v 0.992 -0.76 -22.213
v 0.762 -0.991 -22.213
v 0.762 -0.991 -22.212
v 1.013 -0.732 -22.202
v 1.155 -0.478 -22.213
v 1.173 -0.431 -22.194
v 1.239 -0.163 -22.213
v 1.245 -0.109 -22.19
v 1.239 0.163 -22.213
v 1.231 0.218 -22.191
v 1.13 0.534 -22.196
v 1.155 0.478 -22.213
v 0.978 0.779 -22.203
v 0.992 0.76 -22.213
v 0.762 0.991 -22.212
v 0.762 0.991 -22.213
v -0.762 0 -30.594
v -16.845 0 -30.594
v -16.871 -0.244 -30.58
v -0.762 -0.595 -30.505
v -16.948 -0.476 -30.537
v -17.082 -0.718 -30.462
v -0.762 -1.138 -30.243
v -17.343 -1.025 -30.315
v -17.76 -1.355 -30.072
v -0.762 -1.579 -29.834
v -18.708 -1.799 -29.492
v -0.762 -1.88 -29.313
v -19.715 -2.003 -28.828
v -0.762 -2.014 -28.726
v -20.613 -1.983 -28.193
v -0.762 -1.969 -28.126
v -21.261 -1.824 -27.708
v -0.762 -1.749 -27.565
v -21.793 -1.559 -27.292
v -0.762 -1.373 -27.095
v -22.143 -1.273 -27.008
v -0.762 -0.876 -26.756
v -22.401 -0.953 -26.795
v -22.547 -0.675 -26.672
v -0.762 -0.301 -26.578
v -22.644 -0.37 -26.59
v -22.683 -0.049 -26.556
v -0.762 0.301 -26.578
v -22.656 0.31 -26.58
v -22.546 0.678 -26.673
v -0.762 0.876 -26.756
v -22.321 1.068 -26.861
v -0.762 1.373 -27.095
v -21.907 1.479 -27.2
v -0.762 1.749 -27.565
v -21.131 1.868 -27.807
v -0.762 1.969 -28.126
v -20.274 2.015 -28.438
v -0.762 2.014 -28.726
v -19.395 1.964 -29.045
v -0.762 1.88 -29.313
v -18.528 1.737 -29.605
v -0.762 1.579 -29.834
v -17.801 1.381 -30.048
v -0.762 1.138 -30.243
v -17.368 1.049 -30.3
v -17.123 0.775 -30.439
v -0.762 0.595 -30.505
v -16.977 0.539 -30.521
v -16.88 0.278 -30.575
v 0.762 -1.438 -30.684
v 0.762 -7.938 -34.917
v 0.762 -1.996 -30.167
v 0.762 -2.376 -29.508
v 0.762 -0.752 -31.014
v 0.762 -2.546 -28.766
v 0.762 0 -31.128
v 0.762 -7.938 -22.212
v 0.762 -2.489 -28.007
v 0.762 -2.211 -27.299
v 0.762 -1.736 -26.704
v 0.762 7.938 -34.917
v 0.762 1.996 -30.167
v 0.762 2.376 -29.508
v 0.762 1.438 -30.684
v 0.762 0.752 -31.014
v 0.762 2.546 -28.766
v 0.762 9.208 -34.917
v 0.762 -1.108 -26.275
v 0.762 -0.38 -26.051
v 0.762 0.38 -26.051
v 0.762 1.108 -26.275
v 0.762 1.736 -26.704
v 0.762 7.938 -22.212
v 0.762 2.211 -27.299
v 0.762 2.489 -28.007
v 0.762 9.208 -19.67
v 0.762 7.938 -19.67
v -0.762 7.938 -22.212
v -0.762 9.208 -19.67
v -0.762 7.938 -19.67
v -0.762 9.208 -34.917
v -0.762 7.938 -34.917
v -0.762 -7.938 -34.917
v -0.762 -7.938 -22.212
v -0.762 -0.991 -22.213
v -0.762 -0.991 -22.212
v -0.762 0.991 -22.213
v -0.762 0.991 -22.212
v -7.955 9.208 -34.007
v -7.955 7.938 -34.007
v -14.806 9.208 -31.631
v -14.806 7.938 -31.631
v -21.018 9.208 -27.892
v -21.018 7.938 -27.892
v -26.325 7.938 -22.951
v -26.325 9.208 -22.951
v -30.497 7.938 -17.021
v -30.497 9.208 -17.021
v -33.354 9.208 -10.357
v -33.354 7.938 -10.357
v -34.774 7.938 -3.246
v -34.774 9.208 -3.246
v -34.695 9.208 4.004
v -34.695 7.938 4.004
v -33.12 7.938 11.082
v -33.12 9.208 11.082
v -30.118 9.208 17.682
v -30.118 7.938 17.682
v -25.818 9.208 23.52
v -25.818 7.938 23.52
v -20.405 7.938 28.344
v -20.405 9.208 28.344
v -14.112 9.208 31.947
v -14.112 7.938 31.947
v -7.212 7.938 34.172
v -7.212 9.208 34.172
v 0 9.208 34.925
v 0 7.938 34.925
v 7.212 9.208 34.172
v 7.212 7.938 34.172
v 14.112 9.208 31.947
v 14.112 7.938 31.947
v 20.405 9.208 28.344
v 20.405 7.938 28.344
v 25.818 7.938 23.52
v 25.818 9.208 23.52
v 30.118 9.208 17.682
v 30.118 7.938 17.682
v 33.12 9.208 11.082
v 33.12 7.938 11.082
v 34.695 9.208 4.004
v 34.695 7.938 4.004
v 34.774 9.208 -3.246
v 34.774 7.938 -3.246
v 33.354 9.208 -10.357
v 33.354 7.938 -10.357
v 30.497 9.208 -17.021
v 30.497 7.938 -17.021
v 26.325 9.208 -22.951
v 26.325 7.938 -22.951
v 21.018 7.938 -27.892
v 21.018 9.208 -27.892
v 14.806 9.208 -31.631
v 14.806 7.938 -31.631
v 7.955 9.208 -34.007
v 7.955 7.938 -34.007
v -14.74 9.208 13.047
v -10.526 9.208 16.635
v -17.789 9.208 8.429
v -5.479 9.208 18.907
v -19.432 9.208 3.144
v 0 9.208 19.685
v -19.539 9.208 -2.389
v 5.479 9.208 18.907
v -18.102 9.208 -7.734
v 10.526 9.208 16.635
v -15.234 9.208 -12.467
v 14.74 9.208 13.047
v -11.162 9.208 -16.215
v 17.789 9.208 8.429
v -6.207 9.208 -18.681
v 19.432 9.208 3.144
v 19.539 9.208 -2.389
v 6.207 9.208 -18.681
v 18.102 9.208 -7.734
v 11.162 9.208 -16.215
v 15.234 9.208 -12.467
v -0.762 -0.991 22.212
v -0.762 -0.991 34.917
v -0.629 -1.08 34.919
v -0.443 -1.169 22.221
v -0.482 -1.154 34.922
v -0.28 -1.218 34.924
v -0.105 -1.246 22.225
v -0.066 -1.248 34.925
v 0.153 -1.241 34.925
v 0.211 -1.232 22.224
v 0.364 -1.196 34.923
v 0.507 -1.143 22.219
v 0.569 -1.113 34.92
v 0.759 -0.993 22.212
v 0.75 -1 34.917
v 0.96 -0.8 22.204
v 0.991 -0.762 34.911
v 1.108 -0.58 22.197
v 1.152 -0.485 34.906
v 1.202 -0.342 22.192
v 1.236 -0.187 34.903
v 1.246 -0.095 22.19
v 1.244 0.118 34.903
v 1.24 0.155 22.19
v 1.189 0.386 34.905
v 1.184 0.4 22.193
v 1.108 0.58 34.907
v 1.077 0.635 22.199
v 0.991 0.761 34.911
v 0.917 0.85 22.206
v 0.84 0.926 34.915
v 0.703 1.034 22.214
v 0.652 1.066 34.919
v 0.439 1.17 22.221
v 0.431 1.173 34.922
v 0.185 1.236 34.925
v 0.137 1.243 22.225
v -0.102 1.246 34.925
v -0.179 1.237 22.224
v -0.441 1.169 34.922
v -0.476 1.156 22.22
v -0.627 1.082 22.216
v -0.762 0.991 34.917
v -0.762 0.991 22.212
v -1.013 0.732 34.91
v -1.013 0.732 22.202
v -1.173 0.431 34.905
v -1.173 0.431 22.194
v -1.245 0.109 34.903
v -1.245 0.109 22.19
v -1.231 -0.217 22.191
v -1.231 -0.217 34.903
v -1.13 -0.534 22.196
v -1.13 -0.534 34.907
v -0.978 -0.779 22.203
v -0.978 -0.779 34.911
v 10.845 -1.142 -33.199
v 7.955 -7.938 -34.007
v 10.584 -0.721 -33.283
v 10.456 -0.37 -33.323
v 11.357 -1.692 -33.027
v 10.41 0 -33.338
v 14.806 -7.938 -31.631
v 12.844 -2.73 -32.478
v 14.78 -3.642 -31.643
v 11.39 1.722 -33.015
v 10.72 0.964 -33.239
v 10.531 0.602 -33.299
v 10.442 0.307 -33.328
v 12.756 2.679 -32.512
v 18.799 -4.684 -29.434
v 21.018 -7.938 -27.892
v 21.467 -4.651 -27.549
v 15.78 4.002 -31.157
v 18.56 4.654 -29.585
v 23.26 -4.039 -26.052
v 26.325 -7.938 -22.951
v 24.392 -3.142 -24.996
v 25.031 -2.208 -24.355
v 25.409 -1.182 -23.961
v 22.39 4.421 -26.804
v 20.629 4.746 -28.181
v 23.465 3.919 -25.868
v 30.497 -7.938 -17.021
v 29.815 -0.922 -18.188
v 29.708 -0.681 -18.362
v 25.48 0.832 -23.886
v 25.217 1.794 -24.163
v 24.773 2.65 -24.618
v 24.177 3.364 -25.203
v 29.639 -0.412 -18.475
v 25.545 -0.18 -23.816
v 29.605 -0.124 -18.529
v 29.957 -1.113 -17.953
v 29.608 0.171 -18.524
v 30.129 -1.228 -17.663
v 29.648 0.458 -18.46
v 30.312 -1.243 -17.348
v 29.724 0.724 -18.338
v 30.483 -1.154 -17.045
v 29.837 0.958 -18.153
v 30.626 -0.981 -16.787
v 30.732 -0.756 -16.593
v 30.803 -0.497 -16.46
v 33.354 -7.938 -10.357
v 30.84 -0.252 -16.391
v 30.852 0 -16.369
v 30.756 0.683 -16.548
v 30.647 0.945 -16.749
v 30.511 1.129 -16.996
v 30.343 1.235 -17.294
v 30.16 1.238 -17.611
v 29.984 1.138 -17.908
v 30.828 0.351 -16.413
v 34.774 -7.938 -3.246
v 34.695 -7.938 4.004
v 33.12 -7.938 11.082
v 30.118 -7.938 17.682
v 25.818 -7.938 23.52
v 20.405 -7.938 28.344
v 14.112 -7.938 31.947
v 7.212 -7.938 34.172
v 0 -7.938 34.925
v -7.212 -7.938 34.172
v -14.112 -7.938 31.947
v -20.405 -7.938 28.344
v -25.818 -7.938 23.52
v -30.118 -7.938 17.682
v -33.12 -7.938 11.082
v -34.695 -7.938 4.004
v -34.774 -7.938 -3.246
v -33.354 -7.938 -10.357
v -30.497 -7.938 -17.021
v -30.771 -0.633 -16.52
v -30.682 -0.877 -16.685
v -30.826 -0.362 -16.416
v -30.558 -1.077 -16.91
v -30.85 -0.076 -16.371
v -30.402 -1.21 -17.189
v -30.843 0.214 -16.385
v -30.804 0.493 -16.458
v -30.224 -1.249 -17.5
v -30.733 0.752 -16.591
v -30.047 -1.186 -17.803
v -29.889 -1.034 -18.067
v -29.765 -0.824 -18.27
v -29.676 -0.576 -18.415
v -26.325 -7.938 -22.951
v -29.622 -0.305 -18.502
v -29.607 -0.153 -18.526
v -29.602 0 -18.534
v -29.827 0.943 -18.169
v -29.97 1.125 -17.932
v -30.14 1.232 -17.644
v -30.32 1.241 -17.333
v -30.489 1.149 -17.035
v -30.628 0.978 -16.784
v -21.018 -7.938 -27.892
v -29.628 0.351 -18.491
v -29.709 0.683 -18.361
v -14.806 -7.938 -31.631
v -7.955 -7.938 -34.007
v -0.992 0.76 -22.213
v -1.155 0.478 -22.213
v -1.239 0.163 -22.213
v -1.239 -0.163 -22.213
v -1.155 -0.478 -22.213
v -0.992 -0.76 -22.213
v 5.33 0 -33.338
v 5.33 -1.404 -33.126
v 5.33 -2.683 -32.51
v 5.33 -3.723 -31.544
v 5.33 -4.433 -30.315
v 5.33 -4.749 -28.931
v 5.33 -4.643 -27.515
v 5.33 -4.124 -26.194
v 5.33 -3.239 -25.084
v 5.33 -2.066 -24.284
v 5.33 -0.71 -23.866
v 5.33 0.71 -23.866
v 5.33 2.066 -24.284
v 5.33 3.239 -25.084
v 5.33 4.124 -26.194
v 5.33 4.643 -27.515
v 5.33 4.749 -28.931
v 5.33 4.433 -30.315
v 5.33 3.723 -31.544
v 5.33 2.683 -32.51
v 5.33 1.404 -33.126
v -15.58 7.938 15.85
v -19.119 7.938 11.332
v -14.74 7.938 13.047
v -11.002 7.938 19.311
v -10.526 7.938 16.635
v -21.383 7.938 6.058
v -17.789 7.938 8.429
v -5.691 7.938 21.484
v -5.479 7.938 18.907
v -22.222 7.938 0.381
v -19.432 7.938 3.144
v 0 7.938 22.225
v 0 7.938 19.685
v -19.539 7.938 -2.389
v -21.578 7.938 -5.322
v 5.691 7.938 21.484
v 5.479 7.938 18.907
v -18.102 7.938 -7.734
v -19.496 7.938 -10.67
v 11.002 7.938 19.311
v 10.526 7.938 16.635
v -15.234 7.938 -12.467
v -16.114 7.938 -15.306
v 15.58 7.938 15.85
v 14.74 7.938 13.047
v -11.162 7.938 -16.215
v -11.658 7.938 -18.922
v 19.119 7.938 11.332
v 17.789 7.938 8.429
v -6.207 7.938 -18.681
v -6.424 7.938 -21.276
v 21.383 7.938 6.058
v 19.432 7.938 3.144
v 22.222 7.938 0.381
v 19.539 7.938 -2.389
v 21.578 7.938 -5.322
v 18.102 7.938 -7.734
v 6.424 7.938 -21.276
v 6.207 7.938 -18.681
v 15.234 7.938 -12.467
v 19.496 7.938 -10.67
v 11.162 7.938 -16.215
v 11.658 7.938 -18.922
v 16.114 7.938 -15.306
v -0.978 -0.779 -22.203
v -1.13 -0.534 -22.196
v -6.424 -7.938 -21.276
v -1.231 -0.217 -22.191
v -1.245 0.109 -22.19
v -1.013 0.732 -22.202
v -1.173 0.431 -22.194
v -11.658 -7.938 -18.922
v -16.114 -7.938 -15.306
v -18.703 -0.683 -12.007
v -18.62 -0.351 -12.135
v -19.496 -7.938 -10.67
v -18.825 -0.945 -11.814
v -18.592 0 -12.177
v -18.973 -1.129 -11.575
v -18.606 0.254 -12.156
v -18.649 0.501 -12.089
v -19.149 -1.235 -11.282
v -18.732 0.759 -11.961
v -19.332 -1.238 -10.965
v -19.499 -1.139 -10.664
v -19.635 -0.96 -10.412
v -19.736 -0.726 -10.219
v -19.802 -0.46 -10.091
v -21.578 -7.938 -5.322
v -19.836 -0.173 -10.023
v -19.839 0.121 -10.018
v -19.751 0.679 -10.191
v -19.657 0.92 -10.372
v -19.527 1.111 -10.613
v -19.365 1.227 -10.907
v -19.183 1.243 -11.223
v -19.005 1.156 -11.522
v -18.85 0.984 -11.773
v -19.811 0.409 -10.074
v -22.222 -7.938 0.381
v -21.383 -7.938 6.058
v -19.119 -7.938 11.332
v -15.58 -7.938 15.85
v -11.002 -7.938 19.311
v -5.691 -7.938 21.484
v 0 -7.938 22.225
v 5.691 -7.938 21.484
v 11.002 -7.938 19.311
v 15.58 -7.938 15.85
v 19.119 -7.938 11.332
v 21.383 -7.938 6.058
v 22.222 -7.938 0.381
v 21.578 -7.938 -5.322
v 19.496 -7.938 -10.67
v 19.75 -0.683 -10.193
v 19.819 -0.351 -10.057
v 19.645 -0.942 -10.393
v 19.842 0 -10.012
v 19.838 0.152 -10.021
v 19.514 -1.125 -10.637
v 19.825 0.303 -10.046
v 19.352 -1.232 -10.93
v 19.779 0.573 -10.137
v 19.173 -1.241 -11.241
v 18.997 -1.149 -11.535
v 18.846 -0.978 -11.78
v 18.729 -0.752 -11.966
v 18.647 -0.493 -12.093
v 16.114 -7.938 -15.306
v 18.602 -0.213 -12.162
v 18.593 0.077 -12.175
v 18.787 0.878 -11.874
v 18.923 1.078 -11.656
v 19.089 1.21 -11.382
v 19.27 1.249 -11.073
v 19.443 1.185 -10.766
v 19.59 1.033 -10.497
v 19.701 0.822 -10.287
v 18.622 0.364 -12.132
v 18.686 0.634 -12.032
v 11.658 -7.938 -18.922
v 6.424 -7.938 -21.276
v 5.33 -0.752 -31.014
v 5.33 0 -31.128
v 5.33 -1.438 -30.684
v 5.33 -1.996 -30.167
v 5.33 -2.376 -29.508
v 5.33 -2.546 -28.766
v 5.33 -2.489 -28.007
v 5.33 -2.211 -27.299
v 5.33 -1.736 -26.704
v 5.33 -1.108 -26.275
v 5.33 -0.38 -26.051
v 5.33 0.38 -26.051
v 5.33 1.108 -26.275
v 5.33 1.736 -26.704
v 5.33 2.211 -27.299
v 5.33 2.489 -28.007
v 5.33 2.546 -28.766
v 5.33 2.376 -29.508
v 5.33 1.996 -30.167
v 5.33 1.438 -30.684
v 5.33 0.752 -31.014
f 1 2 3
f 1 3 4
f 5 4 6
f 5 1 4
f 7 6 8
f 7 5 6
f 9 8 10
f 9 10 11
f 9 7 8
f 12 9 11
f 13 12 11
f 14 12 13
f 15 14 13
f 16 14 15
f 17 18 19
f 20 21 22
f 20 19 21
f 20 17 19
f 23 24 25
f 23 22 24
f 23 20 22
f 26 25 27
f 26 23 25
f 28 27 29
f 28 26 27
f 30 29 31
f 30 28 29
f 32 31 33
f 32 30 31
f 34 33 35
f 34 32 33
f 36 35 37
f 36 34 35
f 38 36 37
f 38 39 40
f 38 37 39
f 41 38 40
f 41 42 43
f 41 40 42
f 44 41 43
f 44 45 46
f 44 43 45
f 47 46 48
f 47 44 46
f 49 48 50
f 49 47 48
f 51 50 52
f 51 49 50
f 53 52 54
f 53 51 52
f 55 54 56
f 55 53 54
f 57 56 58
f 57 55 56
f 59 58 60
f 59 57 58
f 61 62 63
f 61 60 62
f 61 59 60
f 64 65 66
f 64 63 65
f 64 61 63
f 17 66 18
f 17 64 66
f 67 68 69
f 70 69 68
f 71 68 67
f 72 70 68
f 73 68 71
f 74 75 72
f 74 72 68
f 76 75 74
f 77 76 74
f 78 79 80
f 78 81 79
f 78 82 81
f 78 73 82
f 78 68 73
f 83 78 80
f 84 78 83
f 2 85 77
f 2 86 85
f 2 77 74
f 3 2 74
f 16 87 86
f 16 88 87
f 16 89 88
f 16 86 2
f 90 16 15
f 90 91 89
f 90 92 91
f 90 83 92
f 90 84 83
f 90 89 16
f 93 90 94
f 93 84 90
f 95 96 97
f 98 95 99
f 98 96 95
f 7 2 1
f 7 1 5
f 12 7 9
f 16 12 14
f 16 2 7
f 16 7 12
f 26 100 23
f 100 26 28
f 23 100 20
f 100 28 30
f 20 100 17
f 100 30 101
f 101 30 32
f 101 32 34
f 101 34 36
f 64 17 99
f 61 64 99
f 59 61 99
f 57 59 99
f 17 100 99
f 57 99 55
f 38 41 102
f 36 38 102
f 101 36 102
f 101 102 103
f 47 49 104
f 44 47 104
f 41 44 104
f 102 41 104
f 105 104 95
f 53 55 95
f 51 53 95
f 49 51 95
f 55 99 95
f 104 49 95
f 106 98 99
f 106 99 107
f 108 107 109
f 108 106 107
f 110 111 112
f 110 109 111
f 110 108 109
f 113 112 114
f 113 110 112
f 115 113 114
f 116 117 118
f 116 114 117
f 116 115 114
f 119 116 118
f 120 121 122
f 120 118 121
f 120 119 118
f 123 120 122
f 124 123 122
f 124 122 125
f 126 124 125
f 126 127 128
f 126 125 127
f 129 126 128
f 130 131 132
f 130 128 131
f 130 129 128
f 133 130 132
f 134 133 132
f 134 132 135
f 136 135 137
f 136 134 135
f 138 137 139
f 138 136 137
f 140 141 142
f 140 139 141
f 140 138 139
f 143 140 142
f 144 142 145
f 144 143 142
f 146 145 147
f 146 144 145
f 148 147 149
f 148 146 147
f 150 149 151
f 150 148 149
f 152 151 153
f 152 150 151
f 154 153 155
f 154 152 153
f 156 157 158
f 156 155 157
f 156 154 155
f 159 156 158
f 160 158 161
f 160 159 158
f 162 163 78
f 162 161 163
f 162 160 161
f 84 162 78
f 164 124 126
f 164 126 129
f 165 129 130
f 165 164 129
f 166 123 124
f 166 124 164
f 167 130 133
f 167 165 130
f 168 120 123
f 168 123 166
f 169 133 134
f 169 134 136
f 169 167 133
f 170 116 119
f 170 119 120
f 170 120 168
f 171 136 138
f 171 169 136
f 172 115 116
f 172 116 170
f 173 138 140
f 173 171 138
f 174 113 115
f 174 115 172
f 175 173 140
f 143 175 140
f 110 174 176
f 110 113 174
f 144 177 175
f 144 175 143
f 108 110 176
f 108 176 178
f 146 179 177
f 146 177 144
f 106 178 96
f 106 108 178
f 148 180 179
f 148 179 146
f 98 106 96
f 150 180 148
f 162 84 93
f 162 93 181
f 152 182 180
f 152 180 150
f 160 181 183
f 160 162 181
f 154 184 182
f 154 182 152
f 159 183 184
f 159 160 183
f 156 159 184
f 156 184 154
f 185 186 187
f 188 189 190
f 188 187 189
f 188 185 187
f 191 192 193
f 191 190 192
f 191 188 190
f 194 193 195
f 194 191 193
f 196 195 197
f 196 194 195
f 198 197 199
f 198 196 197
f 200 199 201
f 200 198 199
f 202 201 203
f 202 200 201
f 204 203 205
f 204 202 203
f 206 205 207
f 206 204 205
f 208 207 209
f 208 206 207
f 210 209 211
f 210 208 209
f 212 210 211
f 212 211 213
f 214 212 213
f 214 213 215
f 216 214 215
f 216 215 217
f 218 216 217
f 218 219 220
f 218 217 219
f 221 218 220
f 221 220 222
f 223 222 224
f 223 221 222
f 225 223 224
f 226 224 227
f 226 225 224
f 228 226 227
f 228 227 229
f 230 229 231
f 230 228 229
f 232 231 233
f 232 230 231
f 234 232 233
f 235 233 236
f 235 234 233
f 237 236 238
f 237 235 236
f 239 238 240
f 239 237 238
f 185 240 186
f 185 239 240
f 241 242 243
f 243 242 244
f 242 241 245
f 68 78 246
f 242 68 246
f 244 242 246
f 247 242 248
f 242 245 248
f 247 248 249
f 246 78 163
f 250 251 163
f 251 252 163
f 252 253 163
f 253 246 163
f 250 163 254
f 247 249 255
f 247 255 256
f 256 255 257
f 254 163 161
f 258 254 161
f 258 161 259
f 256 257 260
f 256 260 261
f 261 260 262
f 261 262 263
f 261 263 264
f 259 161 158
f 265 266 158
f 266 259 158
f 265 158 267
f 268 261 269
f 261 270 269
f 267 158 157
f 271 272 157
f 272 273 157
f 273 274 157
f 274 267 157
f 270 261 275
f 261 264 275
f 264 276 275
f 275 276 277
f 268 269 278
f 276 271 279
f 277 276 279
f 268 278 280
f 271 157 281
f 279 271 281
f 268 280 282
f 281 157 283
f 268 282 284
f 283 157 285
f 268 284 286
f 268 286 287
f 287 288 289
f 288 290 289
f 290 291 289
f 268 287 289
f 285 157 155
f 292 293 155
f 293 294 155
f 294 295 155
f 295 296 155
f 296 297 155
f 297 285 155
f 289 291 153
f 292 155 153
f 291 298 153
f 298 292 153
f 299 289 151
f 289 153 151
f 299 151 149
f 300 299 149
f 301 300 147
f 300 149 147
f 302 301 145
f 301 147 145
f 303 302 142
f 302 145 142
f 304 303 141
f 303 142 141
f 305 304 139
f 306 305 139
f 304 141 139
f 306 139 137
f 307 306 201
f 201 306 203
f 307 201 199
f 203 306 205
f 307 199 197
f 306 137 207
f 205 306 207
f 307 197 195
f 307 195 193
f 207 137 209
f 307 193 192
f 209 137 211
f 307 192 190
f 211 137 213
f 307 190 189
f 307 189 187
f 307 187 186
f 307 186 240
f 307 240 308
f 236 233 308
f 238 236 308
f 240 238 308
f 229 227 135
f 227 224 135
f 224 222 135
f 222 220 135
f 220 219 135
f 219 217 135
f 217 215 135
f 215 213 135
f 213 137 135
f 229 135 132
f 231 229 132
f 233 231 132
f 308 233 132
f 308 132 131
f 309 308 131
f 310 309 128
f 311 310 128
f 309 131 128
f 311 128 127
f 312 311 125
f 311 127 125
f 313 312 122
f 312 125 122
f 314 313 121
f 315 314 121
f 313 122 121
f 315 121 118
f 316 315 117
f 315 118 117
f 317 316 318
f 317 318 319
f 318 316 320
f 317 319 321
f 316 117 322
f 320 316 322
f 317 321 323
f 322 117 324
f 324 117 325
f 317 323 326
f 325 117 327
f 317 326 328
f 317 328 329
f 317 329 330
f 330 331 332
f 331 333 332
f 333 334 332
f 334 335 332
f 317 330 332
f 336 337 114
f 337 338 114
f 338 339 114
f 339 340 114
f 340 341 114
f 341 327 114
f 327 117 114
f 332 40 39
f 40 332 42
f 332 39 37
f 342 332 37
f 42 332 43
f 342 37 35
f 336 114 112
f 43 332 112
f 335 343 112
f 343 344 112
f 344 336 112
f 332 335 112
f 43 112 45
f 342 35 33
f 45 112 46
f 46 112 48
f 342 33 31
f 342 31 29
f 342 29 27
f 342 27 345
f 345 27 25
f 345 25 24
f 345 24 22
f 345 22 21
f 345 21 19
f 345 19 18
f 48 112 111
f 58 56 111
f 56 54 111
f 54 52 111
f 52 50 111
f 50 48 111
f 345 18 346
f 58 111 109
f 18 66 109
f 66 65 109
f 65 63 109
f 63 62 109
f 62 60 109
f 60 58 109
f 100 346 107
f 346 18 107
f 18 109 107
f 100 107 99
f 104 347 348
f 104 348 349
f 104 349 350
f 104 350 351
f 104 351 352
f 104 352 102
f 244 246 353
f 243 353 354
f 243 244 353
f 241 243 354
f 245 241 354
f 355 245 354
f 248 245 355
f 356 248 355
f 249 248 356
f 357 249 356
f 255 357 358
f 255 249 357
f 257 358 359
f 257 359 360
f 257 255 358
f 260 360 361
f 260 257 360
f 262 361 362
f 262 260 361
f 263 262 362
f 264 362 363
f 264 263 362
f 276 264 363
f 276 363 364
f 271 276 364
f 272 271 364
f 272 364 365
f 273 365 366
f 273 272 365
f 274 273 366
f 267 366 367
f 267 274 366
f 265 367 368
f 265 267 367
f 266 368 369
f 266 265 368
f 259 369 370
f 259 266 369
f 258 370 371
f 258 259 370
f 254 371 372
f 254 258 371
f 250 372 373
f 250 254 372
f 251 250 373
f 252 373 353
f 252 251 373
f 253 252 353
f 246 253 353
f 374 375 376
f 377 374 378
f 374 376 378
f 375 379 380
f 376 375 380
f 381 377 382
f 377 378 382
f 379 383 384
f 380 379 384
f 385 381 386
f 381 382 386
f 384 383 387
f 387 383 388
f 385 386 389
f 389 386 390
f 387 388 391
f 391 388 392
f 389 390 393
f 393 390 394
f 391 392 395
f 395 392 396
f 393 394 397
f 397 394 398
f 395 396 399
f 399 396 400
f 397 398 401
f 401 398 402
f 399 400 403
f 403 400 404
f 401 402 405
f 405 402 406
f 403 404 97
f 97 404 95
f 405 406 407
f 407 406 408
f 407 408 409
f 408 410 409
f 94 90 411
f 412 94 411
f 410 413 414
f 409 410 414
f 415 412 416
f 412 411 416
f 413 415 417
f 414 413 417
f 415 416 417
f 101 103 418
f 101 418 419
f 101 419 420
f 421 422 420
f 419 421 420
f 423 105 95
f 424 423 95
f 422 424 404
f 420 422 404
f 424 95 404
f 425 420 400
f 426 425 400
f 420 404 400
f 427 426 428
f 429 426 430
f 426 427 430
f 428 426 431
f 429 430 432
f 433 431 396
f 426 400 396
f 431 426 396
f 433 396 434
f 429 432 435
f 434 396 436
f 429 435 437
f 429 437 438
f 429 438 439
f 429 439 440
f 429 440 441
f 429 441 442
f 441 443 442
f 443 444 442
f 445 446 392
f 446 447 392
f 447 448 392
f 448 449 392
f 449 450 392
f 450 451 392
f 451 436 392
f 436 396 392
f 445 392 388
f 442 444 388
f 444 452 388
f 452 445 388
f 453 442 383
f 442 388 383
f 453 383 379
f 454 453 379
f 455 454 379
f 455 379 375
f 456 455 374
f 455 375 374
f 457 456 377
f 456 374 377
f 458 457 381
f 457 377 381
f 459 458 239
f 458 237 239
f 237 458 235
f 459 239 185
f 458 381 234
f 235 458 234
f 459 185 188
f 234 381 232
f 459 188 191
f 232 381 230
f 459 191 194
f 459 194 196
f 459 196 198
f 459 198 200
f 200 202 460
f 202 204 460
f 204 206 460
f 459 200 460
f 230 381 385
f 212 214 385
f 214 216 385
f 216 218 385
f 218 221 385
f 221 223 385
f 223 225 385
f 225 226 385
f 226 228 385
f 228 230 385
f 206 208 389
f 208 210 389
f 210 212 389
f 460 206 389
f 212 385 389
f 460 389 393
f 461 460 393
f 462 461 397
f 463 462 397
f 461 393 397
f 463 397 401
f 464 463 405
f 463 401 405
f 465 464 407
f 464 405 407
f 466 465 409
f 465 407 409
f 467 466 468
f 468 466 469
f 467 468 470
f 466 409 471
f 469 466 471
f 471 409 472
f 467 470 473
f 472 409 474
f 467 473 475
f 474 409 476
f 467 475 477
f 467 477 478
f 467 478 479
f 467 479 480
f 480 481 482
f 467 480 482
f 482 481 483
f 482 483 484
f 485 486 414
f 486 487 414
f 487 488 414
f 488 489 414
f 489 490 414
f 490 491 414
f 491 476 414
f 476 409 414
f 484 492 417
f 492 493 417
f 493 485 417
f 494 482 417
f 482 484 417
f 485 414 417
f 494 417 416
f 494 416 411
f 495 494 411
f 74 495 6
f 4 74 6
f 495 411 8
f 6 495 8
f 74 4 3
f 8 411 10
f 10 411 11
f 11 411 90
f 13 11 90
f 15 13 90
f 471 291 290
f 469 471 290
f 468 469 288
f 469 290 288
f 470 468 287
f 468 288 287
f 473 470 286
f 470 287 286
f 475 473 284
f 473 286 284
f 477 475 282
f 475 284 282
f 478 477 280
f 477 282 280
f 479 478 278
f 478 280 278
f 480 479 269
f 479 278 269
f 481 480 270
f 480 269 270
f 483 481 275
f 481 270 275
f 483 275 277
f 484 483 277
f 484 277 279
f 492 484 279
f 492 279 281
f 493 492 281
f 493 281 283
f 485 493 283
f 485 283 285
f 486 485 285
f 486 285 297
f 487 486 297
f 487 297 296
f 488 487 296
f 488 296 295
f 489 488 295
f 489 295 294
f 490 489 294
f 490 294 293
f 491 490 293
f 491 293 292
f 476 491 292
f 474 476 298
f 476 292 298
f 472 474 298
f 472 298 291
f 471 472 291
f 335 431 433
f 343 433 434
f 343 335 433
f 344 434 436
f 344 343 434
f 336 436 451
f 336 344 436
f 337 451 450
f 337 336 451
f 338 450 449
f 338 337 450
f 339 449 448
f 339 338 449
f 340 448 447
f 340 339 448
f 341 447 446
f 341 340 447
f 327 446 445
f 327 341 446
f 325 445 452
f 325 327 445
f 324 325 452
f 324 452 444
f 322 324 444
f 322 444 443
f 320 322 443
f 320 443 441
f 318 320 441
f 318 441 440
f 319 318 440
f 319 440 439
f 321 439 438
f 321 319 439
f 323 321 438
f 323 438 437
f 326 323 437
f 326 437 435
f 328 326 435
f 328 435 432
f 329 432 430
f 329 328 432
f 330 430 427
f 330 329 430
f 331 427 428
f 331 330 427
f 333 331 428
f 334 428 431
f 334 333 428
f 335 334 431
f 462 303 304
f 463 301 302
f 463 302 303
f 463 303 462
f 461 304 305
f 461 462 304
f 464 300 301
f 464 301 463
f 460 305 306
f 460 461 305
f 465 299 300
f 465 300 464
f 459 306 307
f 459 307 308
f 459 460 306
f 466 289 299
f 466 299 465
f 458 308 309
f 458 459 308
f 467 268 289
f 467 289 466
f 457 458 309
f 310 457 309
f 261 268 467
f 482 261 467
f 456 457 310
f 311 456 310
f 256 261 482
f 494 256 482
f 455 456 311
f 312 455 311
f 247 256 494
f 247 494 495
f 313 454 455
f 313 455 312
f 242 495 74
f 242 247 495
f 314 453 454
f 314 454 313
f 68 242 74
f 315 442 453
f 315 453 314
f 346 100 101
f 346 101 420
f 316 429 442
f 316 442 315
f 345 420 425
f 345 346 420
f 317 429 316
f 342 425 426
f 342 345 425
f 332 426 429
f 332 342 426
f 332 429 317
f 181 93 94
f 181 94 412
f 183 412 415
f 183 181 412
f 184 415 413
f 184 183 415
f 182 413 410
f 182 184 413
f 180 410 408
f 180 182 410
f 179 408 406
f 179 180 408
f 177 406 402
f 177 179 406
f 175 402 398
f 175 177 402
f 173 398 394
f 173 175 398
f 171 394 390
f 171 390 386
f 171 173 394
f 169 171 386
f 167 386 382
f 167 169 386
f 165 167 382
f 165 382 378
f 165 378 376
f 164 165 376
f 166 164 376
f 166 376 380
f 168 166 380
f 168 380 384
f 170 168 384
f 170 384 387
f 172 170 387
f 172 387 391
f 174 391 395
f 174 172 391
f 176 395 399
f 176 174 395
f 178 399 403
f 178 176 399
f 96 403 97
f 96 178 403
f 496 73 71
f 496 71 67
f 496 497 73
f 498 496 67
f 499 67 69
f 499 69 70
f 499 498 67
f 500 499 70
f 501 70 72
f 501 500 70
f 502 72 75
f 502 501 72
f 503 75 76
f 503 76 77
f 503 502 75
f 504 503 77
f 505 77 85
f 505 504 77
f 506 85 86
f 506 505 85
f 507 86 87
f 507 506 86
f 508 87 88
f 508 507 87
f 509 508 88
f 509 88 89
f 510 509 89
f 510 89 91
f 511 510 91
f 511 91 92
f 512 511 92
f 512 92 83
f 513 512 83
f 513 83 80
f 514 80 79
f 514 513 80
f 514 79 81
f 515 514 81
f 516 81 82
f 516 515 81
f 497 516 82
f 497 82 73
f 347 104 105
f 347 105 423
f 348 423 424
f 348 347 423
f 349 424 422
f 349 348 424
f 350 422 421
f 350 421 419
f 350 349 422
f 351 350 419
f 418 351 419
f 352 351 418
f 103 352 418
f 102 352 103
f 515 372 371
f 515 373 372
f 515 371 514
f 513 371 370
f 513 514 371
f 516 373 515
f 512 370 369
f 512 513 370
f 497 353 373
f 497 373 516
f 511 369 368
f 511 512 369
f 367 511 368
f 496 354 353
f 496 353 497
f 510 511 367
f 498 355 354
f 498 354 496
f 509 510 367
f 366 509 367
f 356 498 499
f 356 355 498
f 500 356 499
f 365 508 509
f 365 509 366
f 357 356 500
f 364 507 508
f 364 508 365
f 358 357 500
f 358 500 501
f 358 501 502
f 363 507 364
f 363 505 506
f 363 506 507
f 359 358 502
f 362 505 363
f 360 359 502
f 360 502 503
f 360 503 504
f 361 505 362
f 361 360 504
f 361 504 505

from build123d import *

# Parameters (mm, degrees)
BOSS_EXTRUDE1_DEPTH        = 7.9375
F_2_5MM_DOWEL_HOLE1_REACH  = 85.992
F_2_5MM_DOWEL_HOLE1_BORE_R = 1.25
CIRPATTERN1_START          = -22.212933302
CIRPATTERN1_DEPTH          = 57.137933384
CIRPATTERN1_START_2        = -34.9250001
CIRPATTERN1_2_OUTLINE_R    = 1.25
CIRPATTERN1_2_DEPTH        = 12.735179899
BOSS_EXTRUDE2_START        = 1.27
BOSS_EXTRUDE2_DEPTH        = 1.27


# Read off the part's stored shape, not the designer's step: CirPattern1
with BuildPart() as part:
    # Sketch1 → Boss-Extrude1 (new, symmetric)
    with BuildSketch(Plane(origin=(0, 0, 0), x_dir=(1, 0, 0), z_dir=(0, 1, 0))):
        with BuildLine():
            Line((-0.762, 34.916686283), (-0.762, 22.211933302))
            ThreePointArc((-0.762, 22.211933302), (0, -22.225), (0.762, 22.211933302))
            Line((0.762, 22.211933302), (0.762, 34.916686283))
            ThreePointArc((0.762, 34.916686283), (0, -34.925), (-0.762, 34.916686283))
        make_face()
    extrude(amount=BOSS_EXTRUDE1_DEPTH, both=True)

    # Sketch2 → Cut-Revolve1 (revolve, cut)
    with BuildSketch(Plane(origin=(0, 0, 0), x_dir=(1, 0, 0), z_dir=(0, 1, 0)), mode=Mode.PRIVATE) as cut_revolve1_sk:
        Polygon((-22.683703898, 26.5557), (0.762, 26.5557), (0.762, 26.0223), (5.329933657, 26.0223), (5.329933657, 23.8125), (25.548394641, 23.8125), (25.548394641, 28.575), (-22.683703898, 28.575), align=None)
    revolve(cut_revolve1_sk.sketch.rotate(Axis((-22.683703898, 0, -28.575), (-1, 0, 0)), 180), axis=Axis((-22.683703898, 0, -28.575), (-1, 0, 0)), mode=Mode.SUBTRACT)

    # Ø2.5mm Dowel Hole1 bore (on position points) → Ø2.5mm Dowel Hole1 (cut, up to next)
    with BuildSketch(Plane(origin=(30.245937227, 0, -17.4625), x_dir=(0.5, 0, 0.866025403784), z_dir=(0.866025403784, 0, -0.5)), mode=Mode.PRIVATE) as f_2_5mm_dowel_hole1_sk1:
        Circle(F_2_5MM_DOWEL_HOLE1_BORE_R)
    f_2_5mm_dowel_hole1_tool1 = extrude(f_2_5mm_dowel_hole1_sk1.sketch, amount=-F_2_5MM_DOWEL_HOLE1_REACH, mode=Mode.PRIVATE) & part.part
    add(f_2_5mm_dowel_hole1_tool1.solids().sort_by_distance((30.245937, 0, -17.4625))[0], mode=Mode.SUBTRACT)

    # CirPattern1 outline → CirPattern1 (cut)
    with BuildSketch(Plane.XY.offset(CIRPATTERN1_START)):
        with BuildLine():
            ThreePointArc((-0.762, -0.990886472), (1.25, 0), (-0.762, 0.990886472))
            ThreePointArc((-0.762, 0.990886472), (-1.25, 0), (-0.762, -0.990886472))
        make_face()
    extrude(amount=CIRPATTERN1_DEPTH, mode=Mode.SUBTRACT)

    # CirPattern1 2 outline → CirPattern1 2 (cut)
    with BuildSketch(Plane(origin=(0, 0, 0), x_dir=(0.500000000000004, 0, -0.8660254037844363), z_dir=(0.8660254037844363, 0, 0.5000000000000042)).offset(CIRPATTERN1_START_2)):
        Circle(CIRPATTERN1_2_OUTLINE_R)
    extrude(amount=CIRPATTERN1_2_DEPTH, mode=Mode.SUBTRACT)

    # Sketch4 → Boss-Extrude2 (add)
    with BuildSketch(Plane(origin=(0, 7.9375, 0), x_dir=(1, 0, 0), z_dir=(0, 1, 0)).offset(BOSS_EXTRUDE2_START)):
        with BuildLine():
            Line((0.762, 34.916686283), (0.762, 19.670246084))
            ThreePointArc((0.762, 19.670246084), (0, -19.685), (-0.762, 19.670246084))
            Line((-0.762, 19.670246084), (-0.762, 34.916686283))
            ThreePointArc((-0.762, 34.916686283), (0, -34.925), (0.762, 34.916686283))
        make_face()
    extrude(amount=-BOSS_EXTRUDE2_DEPTH)


solid = part.part
